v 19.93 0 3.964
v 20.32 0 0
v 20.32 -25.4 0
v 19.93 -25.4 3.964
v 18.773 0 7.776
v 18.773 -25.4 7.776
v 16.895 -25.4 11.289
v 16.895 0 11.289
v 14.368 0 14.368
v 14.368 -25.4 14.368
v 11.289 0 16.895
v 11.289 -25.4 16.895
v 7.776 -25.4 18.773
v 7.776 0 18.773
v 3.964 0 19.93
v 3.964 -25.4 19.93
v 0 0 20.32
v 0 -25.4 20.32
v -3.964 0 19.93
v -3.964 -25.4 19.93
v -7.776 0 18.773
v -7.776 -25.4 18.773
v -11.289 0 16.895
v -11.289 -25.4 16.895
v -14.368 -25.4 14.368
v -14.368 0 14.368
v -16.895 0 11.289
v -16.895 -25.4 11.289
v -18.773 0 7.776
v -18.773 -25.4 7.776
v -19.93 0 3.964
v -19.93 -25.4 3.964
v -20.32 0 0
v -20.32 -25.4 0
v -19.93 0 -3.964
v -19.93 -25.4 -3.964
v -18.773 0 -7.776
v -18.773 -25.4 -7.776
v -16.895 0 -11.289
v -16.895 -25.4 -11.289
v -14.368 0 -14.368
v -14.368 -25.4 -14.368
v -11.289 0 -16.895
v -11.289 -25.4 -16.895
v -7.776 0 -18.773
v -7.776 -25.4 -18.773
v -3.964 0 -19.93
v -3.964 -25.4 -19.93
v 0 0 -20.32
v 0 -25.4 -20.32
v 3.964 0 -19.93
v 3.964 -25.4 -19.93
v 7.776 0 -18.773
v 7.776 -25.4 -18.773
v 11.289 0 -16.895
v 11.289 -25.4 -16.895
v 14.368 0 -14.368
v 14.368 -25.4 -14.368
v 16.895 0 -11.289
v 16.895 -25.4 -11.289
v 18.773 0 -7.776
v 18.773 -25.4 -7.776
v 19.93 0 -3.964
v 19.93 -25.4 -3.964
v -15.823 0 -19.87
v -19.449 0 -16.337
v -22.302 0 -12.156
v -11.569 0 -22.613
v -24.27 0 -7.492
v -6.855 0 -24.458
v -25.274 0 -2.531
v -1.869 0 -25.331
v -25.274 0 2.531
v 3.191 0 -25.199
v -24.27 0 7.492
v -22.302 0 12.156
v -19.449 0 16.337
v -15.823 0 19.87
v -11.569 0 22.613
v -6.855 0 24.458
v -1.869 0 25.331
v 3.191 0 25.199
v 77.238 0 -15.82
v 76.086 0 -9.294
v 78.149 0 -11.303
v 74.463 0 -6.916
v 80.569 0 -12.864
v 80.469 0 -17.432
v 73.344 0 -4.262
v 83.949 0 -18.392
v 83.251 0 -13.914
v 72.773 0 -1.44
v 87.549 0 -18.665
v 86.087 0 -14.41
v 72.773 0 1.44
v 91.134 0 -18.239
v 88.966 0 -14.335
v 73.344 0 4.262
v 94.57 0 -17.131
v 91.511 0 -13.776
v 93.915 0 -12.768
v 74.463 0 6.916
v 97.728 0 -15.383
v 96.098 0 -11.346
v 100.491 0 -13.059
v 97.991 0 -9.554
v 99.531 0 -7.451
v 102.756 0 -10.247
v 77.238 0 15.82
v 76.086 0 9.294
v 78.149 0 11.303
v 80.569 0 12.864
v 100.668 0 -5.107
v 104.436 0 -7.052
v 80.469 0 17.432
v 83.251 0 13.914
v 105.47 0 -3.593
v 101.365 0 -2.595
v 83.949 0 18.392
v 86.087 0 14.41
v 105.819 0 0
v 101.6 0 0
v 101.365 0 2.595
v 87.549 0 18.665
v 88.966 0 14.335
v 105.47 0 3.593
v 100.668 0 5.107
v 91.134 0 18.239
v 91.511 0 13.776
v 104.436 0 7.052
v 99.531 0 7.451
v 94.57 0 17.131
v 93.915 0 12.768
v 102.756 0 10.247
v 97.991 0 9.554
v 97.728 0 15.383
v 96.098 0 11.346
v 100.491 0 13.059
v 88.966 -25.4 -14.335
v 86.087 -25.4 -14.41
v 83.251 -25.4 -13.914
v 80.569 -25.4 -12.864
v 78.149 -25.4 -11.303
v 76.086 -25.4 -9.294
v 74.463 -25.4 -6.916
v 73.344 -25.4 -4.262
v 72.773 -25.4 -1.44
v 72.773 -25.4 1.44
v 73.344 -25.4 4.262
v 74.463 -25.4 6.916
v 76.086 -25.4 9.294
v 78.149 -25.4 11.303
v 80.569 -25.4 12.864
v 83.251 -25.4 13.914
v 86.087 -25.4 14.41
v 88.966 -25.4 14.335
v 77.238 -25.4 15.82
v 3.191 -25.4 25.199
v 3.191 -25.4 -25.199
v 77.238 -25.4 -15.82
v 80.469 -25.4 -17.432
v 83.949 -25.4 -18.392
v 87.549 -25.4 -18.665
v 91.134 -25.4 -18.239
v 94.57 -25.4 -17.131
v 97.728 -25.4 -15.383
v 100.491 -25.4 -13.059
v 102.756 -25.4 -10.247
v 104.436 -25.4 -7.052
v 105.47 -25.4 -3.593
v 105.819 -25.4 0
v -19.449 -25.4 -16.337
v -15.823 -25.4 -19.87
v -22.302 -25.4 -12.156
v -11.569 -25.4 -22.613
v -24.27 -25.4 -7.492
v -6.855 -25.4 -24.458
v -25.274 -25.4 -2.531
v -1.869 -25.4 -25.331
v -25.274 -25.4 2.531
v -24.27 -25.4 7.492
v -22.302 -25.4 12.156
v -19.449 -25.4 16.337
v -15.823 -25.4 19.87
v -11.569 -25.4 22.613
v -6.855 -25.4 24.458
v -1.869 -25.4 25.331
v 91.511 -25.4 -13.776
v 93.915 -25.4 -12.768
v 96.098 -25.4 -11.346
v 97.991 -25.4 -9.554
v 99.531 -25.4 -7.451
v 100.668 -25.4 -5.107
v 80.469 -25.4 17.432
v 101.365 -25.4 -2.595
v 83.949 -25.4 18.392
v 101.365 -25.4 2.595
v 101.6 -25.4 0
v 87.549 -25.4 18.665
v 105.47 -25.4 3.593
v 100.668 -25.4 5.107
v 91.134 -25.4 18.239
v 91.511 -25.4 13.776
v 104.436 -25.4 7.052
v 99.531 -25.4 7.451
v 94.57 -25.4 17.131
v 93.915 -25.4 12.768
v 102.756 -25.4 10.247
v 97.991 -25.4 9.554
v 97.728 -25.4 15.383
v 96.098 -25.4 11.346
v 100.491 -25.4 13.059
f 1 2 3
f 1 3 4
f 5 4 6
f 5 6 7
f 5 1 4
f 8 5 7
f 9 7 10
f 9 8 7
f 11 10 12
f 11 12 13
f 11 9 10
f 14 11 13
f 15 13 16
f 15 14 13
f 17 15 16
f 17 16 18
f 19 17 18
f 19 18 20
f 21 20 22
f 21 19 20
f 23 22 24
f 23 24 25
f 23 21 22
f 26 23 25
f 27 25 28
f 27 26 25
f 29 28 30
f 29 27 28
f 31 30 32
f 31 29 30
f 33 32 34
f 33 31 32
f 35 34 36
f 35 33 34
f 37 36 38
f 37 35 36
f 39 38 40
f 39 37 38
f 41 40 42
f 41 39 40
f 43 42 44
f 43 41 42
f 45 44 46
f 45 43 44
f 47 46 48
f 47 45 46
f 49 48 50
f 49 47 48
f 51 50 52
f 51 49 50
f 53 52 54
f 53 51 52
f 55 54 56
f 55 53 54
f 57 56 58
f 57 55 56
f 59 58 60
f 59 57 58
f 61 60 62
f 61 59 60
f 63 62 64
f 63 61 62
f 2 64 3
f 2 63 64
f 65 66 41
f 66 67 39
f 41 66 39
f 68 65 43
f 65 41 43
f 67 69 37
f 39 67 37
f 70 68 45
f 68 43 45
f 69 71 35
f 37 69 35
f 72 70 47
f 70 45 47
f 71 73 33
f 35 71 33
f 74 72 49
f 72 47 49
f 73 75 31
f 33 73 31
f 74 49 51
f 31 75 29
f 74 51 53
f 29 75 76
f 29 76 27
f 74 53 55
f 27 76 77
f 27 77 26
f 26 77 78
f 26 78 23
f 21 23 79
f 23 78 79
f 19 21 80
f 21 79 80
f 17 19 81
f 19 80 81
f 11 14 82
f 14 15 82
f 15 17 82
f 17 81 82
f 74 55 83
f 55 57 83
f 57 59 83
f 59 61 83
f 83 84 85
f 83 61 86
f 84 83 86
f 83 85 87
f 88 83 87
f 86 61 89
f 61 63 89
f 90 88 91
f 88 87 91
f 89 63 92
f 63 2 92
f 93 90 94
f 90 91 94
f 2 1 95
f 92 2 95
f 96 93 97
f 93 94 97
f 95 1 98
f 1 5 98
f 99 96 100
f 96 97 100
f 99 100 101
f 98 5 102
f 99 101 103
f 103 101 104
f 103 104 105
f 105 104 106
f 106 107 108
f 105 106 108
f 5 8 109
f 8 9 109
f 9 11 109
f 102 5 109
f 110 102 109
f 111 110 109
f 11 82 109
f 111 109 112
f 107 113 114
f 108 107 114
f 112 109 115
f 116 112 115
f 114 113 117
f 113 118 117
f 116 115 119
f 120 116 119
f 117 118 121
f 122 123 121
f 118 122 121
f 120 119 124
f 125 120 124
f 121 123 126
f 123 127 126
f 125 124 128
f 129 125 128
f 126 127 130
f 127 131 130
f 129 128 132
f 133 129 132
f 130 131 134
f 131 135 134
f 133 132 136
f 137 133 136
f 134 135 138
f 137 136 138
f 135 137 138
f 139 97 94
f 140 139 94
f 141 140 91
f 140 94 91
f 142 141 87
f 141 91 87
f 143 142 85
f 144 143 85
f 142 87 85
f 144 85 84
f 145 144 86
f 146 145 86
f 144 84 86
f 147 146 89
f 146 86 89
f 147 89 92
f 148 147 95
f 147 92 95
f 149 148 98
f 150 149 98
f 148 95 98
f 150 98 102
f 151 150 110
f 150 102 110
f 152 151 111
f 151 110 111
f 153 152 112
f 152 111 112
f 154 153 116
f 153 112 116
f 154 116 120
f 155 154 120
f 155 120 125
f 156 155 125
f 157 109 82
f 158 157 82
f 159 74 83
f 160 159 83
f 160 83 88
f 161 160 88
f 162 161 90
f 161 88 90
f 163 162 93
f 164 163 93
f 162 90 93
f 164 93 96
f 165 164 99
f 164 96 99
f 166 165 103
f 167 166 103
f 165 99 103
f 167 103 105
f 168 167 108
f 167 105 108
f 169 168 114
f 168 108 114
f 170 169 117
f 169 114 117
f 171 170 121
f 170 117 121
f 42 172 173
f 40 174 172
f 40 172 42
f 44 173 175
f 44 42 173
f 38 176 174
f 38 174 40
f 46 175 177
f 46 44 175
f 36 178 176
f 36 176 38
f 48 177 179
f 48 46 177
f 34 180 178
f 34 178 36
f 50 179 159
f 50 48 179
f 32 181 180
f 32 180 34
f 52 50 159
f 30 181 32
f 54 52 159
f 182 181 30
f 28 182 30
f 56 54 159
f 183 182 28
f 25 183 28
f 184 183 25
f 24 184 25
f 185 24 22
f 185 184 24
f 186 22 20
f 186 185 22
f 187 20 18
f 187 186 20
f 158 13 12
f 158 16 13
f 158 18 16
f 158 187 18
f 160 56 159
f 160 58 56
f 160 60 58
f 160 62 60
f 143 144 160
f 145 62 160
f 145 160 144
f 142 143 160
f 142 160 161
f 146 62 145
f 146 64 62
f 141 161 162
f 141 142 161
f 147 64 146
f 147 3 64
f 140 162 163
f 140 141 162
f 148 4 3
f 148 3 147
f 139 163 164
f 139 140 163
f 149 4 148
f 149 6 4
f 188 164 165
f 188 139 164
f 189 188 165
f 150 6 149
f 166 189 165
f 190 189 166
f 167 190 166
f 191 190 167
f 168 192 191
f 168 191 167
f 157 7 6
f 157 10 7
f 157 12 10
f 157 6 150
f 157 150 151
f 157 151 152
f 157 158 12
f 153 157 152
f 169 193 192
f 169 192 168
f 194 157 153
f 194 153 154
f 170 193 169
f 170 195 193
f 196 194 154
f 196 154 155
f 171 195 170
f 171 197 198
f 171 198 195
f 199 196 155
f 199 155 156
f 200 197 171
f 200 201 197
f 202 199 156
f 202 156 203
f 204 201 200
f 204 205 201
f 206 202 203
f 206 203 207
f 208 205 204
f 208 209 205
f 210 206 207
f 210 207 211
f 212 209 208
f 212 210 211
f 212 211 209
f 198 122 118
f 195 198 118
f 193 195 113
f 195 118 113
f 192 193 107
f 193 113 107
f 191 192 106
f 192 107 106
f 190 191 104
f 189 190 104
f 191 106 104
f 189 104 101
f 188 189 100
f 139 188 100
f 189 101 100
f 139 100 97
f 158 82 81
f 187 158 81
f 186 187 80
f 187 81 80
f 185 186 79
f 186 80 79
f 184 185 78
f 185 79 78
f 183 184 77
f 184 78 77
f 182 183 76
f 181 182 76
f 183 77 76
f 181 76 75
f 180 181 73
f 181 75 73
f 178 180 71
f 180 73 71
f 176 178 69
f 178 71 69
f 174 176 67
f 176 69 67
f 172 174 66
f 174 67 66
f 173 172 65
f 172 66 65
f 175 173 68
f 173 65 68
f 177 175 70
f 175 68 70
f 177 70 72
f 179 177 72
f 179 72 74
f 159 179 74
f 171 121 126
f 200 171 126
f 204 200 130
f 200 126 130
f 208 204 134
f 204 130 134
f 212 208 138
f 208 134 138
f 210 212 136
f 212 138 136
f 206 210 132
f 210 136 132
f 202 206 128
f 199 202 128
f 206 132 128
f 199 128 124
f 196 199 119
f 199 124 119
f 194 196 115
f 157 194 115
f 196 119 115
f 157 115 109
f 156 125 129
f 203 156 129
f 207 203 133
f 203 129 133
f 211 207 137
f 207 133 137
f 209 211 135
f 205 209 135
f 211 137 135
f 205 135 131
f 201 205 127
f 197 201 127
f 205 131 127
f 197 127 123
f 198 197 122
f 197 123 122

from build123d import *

# Parameters (mm, degrees)
F0_R     = 20.32
F1_DEPTH = 25.4


with BuildPart() as f1:
    # F0 (on Front) → F1 (new body)
    with BuildSketch(Plane.XZ):
        with BuildLine():
            ThreePointArc((3.191482456, -25.1986991675), (19.05549336, -16.794289887), (25.4, 0))
            ThreePointArc((25.4, 0), (19.05549336, 16.794289887), (3.191482456, 25.1986991675))
            ThreePointArc((3.191482456, 25.1986991675), (-25.4, 0), (3.191482456, -25.1986991675))
        make_face()
        Circle(F0_R, mode=Mode.SUBTRACT)
        with BuildLine():
            ThreePointArc((3.191482456, 25.1986991675), (19.05549336, 16.794289887), (25.4, 0))
            ThreePointArc((25.4, 0), (19.05549336, -16.794289887), (3.191482456, -25.1986991675))
            Line((3.191482456, -25.1986991675), (77.238430457, -15.8204557155))
            ThreePointArc((77.238430457, -15.8204557155), (68.4813106902, 0), (77.238430457, 15.8204557155))
            Line((77.238430457, 15.8204557155), (3.191482456, 25.1986991675))
        make_face()
        with BuildLine():
            ThreePointArc((105.8193823808, 0), (96.1915572628, 16.333689356), (77.238430457, 15.8204557155))
            Line((77.238430457, 15.8204557155), (88.965929824, 14.3351366427))
            ThreePointArc((88.965929824, 14.3351366427), (97.9907117184, 9.5540027185), (101.6, 0))
            ThreePointArc((101.6, 0), (97.9907117184, -9.5540027185), (88.965929824, -14.3351366427))
            Line((88.965929824, -14.3351366427), (77.238430457, -15.8204557155))
            ThreePointArc((77.238430457, -15.8204557155), (96.1915572628, -16.333689356), (105.8193823808, 0))
        make_face()
        with BuildLine():
            Line((88.965929824, 14.3351366427), (77.238430457, 15.8204557155))
            ThreePointArc((77.238430457, 15.8204557155), (68.4813106902, 0), (77.238430457, -15.8204557155))
            Line((77.238430457, -15.8204557155), (88.965929824, -14.3351366427))
            ThreePointArc((88.965929824, -14.3351366427), (72.7006930711, 0), (88.965929824, 14.3351366427))
        make_face()
    extrude(amount=F1_DEPTH)


solid = f1.part
